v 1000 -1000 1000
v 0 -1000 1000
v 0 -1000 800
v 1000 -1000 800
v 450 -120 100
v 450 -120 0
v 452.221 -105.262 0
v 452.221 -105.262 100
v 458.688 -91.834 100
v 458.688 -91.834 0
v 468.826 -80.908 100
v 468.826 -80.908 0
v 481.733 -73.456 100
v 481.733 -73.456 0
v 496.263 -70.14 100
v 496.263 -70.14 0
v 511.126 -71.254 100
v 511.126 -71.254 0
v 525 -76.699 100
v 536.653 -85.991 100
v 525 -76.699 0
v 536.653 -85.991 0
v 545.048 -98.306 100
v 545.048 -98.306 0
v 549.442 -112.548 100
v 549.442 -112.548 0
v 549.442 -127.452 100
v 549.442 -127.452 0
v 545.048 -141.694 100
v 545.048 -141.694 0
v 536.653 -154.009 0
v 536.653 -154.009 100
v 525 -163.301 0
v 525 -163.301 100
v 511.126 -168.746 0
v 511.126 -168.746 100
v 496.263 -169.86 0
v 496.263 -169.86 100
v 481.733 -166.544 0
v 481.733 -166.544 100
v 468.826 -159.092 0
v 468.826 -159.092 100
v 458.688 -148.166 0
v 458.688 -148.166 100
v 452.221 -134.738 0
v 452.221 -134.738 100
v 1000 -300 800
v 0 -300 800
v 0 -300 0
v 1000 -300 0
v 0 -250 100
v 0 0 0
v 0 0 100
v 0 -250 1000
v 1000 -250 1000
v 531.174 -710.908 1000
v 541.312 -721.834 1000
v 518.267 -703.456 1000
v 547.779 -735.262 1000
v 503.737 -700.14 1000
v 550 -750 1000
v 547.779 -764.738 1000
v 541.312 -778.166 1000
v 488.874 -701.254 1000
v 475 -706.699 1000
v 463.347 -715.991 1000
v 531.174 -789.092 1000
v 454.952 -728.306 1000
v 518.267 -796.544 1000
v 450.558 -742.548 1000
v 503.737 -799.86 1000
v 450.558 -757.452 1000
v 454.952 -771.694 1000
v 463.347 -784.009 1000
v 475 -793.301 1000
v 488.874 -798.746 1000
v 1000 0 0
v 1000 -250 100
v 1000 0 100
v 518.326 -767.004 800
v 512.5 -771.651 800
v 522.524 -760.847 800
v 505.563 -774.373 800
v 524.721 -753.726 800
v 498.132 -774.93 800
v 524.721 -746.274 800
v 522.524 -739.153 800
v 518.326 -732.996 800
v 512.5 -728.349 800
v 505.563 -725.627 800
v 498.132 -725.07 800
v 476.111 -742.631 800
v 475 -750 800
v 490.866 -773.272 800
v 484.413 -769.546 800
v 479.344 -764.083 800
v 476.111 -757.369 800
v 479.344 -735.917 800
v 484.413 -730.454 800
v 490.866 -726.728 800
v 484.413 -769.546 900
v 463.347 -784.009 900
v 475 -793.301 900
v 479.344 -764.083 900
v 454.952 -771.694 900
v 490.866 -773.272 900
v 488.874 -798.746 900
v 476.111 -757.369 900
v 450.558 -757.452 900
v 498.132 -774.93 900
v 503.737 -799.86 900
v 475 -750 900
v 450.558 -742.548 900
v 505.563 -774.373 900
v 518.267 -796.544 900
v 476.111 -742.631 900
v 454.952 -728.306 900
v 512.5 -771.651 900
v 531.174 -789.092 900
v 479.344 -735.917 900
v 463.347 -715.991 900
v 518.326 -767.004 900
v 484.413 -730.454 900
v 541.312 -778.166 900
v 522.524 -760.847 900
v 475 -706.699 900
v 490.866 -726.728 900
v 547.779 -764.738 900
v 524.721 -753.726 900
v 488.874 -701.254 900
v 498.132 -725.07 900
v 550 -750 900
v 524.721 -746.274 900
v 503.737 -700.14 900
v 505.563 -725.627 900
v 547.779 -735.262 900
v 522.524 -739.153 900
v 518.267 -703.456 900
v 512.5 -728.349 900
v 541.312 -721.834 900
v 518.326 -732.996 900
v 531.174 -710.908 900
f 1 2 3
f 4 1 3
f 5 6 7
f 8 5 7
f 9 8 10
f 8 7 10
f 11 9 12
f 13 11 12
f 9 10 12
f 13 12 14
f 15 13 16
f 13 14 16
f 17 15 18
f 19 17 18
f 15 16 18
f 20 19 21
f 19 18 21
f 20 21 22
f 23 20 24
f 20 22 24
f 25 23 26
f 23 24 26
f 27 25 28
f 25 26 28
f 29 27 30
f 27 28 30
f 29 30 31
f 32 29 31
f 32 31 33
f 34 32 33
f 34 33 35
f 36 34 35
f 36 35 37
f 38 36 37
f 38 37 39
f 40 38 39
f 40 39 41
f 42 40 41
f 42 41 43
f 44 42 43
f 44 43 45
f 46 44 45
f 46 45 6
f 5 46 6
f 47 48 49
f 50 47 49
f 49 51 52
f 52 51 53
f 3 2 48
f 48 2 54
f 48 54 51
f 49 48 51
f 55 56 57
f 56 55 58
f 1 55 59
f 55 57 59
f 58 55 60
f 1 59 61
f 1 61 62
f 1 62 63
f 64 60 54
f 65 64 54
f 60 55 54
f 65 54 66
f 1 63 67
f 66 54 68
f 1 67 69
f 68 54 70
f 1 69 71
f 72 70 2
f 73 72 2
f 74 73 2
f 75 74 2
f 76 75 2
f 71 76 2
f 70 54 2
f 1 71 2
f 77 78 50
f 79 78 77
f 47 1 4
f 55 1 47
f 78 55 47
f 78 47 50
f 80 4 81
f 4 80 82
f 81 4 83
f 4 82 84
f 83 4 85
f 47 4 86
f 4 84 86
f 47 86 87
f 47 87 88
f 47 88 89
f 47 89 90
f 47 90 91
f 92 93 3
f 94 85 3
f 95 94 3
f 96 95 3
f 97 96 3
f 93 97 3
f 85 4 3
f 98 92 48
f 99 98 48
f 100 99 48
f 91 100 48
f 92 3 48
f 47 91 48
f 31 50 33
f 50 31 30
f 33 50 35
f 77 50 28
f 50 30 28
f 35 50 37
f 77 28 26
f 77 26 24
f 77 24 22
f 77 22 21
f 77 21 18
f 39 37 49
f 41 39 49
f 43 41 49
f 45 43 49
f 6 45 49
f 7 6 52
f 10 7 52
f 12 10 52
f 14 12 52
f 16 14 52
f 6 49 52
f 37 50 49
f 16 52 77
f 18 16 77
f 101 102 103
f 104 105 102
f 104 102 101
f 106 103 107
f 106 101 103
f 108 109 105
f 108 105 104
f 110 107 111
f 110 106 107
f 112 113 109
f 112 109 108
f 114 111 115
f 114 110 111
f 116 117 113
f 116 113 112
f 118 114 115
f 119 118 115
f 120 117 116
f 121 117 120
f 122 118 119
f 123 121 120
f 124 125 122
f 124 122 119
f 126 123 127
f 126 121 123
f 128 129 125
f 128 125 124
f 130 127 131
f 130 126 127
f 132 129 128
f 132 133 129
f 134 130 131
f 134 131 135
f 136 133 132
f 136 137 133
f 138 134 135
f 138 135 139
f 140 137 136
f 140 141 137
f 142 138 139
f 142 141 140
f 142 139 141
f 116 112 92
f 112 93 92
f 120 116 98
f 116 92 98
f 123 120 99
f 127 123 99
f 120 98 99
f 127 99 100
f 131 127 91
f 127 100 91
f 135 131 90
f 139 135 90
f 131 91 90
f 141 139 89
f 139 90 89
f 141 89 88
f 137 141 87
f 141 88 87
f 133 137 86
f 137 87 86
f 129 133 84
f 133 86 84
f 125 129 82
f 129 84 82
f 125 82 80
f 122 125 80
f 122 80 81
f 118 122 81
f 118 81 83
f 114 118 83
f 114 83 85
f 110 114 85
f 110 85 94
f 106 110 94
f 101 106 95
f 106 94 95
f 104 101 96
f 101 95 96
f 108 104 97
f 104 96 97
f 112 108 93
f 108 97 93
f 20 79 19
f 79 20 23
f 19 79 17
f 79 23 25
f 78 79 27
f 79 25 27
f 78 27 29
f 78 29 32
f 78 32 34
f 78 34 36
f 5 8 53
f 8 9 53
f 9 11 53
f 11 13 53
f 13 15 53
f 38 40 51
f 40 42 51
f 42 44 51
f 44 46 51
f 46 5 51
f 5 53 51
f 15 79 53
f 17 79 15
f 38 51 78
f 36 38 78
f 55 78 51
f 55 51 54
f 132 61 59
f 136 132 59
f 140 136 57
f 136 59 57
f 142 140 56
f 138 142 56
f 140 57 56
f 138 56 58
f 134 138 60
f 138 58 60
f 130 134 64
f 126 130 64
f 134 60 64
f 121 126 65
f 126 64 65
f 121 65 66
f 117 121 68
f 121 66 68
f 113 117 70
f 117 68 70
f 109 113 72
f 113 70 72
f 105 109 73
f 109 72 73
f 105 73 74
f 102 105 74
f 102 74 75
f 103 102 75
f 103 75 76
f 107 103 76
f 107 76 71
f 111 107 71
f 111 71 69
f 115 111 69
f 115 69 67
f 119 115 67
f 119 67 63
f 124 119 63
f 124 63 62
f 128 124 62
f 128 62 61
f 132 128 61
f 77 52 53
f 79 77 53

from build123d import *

# Parameters (mm, degrees)
F1_DEPTH       = 1000
F3_D           = 100
F5_D           = 50
F5_CBORE_D     = 100
F5_CBORE_DEPTH = 100


with BuildPart() as f1:
    # F0 (on Right) → F1 (new body)
    with BuildSketch(Plane.YZ):
        Polygon((-300, 0), (0, 0), (0, 100), (-250, 100), (-250, 1000), (-1000, 1000), (-1000, 800), (-300, 800), align=None)
    extrude(amount=F1_DEPTH)

    # F3 (through all)
    with Locations(Plane.XY.offset(100)):
        with Locations((500, -120)):
            Hole(F3_D / 2)

    # F5 (through all)
    with Locations(Plane.XY.offset(1000)):
        with Locations((500, -750)):
            CounterBoreHole(F5_D / 2, F5_CBORE_D / 2, F5_CBORE_DEPTH)


solid = f1.part
